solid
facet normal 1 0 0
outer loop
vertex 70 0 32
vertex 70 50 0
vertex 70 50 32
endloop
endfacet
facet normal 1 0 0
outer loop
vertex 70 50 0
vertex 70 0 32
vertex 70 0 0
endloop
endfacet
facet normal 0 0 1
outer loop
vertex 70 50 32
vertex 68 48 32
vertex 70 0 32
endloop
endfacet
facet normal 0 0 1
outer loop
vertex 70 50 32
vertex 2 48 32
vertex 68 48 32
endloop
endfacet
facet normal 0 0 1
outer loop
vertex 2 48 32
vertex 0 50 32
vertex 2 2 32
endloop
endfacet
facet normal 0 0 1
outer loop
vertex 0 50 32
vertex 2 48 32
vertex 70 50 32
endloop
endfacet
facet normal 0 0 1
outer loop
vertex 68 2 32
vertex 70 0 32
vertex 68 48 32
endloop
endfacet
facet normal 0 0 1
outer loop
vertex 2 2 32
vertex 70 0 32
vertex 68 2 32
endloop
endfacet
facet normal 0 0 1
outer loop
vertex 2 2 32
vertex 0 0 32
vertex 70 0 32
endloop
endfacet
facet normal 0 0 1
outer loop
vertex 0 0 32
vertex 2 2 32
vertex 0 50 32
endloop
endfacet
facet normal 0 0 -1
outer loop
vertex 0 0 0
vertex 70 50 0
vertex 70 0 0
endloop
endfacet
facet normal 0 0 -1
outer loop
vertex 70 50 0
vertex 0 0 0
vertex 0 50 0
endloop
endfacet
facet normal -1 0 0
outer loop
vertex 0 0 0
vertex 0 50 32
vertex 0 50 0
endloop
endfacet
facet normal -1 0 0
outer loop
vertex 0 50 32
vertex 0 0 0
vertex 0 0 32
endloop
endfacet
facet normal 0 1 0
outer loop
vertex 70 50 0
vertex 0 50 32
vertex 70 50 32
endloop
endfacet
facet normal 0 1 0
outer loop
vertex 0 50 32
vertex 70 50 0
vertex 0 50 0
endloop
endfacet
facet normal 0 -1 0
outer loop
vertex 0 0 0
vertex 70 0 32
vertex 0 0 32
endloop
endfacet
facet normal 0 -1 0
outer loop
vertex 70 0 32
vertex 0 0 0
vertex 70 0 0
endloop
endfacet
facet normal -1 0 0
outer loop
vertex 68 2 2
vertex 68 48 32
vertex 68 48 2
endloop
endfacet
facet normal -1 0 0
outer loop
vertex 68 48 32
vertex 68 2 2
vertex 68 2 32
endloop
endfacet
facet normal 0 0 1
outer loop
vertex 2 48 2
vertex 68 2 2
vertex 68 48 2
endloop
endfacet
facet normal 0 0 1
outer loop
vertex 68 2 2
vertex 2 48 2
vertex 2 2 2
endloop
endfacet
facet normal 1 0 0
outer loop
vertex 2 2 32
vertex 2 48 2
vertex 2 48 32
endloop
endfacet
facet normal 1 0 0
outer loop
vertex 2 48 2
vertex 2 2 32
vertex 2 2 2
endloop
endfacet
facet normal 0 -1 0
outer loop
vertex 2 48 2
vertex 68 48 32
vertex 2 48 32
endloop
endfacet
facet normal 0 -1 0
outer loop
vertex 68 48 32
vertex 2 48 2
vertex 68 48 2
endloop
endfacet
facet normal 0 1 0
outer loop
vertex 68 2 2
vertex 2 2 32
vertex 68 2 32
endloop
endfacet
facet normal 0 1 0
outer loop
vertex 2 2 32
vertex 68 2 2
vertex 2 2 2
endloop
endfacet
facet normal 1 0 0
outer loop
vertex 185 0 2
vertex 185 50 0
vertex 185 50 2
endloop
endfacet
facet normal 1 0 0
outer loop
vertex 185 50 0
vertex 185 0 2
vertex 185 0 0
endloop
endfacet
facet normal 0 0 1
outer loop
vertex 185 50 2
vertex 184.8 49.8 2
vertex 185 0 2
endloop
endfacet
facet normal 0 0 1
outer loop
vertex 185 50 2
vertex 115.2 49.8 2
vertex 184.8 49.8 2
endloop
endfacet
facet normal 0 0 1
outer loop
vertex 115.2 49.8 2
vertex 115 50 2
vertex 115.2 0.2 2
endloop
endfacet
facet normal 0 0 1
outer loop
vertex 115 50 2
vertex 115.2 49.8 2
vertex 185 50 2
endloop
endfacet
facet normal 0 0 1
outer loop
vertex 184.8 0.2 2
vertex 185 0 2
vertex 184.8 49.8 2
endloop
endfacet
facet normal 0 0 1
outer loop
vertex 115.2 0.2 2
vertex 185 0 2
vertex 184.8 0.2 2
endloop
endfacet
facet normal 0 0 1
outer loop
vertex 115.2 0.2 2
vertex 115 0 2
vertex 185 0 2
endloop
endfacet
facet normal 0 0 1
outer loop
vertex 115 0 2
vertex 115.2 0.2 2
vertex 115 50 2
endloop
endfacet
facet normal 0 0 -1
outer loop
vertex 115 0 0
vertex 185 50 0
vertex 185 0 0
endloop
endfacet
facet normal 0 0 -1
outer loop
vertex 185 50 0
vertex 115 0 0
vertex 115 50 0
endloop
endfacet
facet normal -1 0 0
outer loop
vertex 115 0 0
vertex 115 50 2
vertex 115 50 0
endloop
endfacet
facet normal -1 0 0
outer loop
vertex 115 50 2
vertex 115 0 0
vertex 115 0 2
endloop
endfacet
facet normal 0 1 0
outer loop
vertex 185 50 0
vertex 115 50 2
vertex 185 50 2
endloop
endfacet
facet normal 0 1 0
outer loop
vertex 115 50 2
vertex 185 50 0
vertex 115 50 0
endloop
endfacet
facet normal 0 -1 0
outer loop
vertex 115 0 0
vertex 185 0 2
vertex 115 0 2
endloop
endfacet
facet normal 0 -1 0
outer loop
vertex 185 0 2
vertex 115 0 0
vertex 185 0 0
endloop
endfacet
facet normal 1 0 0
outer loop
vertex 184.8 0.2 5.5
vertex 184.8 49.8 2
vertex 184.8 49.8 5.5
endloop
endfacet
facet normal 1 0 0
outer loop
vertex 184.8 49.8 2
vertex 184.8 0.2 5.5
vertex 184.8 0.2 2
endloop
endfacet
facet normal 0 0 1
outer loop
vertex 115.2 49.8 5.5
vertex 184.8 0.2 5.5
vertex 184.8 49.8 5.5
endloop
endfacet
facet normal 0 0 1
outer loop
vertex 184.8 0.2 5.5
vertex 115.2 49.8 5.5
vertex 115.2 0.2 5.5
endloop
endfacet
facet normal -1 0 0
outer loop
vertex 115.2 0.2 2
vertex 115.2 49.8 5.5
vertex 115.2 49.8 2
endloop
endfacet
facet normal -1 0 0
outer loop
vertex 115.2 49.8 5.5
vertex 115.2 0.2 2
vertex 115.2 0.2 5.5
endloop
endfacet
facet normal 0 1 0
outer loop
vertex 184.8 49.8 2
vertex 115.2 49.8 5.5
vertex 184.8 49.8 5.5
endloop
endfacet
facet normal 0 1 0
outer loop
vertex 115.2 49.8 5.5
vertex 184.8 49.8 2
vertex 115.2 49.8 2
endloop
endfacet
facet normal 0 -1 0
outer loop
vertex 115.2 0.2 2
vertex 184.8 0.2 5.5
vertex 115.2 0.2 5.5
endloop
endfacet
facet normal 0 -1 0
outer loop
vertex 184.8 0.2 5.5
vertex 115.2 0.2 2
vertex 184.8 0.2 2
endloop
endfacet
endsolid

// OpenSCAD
// Two-part box enclosure for a small electronics board (e.g. an Arduino-based temperature logger),
// printed as one piece with a part between them. NOVEL general part.
//

box_x   = 70;
box_y   = 50;
box_z   = 30;
wall    = 2;
floor   = 2;

lip_t   = 1.5;
lip_h   = 4;
clearance = 0.2;

$fn = 48;

part_center_x = (box_x + box_x + 10) / 2;      // two parts with a 10 mm gap, centred on the bed
part_center_y = box_y / 2;

module box() {
    difference() {
        cube([box_x, box_y, box_z + floor]);
        translate([wall, wall, floor]) cube([box_x - 2 * wall, box_y - 2 * wall, box_z + 1]);   // hollow, open top
    }
}

module lid() {
    plate_h = 2;
    union() {
        translate([part_center_x - box_x / 2, part_center_y - box_y / 2, 0])
            cube([box_x, box_y, plate_h]);                                          // plate
        translate([part_center_x - (box_x / 2 - clearance), part_center_y - (box_y / 2 - clearance), 0])
            cube([box_x - 2 * clearance, box_y - 2 * clearance, lip_h + lip_t]);    // lip (open top)
    }
}

box();
translate([part_center_x, 0, 0]) lid();
